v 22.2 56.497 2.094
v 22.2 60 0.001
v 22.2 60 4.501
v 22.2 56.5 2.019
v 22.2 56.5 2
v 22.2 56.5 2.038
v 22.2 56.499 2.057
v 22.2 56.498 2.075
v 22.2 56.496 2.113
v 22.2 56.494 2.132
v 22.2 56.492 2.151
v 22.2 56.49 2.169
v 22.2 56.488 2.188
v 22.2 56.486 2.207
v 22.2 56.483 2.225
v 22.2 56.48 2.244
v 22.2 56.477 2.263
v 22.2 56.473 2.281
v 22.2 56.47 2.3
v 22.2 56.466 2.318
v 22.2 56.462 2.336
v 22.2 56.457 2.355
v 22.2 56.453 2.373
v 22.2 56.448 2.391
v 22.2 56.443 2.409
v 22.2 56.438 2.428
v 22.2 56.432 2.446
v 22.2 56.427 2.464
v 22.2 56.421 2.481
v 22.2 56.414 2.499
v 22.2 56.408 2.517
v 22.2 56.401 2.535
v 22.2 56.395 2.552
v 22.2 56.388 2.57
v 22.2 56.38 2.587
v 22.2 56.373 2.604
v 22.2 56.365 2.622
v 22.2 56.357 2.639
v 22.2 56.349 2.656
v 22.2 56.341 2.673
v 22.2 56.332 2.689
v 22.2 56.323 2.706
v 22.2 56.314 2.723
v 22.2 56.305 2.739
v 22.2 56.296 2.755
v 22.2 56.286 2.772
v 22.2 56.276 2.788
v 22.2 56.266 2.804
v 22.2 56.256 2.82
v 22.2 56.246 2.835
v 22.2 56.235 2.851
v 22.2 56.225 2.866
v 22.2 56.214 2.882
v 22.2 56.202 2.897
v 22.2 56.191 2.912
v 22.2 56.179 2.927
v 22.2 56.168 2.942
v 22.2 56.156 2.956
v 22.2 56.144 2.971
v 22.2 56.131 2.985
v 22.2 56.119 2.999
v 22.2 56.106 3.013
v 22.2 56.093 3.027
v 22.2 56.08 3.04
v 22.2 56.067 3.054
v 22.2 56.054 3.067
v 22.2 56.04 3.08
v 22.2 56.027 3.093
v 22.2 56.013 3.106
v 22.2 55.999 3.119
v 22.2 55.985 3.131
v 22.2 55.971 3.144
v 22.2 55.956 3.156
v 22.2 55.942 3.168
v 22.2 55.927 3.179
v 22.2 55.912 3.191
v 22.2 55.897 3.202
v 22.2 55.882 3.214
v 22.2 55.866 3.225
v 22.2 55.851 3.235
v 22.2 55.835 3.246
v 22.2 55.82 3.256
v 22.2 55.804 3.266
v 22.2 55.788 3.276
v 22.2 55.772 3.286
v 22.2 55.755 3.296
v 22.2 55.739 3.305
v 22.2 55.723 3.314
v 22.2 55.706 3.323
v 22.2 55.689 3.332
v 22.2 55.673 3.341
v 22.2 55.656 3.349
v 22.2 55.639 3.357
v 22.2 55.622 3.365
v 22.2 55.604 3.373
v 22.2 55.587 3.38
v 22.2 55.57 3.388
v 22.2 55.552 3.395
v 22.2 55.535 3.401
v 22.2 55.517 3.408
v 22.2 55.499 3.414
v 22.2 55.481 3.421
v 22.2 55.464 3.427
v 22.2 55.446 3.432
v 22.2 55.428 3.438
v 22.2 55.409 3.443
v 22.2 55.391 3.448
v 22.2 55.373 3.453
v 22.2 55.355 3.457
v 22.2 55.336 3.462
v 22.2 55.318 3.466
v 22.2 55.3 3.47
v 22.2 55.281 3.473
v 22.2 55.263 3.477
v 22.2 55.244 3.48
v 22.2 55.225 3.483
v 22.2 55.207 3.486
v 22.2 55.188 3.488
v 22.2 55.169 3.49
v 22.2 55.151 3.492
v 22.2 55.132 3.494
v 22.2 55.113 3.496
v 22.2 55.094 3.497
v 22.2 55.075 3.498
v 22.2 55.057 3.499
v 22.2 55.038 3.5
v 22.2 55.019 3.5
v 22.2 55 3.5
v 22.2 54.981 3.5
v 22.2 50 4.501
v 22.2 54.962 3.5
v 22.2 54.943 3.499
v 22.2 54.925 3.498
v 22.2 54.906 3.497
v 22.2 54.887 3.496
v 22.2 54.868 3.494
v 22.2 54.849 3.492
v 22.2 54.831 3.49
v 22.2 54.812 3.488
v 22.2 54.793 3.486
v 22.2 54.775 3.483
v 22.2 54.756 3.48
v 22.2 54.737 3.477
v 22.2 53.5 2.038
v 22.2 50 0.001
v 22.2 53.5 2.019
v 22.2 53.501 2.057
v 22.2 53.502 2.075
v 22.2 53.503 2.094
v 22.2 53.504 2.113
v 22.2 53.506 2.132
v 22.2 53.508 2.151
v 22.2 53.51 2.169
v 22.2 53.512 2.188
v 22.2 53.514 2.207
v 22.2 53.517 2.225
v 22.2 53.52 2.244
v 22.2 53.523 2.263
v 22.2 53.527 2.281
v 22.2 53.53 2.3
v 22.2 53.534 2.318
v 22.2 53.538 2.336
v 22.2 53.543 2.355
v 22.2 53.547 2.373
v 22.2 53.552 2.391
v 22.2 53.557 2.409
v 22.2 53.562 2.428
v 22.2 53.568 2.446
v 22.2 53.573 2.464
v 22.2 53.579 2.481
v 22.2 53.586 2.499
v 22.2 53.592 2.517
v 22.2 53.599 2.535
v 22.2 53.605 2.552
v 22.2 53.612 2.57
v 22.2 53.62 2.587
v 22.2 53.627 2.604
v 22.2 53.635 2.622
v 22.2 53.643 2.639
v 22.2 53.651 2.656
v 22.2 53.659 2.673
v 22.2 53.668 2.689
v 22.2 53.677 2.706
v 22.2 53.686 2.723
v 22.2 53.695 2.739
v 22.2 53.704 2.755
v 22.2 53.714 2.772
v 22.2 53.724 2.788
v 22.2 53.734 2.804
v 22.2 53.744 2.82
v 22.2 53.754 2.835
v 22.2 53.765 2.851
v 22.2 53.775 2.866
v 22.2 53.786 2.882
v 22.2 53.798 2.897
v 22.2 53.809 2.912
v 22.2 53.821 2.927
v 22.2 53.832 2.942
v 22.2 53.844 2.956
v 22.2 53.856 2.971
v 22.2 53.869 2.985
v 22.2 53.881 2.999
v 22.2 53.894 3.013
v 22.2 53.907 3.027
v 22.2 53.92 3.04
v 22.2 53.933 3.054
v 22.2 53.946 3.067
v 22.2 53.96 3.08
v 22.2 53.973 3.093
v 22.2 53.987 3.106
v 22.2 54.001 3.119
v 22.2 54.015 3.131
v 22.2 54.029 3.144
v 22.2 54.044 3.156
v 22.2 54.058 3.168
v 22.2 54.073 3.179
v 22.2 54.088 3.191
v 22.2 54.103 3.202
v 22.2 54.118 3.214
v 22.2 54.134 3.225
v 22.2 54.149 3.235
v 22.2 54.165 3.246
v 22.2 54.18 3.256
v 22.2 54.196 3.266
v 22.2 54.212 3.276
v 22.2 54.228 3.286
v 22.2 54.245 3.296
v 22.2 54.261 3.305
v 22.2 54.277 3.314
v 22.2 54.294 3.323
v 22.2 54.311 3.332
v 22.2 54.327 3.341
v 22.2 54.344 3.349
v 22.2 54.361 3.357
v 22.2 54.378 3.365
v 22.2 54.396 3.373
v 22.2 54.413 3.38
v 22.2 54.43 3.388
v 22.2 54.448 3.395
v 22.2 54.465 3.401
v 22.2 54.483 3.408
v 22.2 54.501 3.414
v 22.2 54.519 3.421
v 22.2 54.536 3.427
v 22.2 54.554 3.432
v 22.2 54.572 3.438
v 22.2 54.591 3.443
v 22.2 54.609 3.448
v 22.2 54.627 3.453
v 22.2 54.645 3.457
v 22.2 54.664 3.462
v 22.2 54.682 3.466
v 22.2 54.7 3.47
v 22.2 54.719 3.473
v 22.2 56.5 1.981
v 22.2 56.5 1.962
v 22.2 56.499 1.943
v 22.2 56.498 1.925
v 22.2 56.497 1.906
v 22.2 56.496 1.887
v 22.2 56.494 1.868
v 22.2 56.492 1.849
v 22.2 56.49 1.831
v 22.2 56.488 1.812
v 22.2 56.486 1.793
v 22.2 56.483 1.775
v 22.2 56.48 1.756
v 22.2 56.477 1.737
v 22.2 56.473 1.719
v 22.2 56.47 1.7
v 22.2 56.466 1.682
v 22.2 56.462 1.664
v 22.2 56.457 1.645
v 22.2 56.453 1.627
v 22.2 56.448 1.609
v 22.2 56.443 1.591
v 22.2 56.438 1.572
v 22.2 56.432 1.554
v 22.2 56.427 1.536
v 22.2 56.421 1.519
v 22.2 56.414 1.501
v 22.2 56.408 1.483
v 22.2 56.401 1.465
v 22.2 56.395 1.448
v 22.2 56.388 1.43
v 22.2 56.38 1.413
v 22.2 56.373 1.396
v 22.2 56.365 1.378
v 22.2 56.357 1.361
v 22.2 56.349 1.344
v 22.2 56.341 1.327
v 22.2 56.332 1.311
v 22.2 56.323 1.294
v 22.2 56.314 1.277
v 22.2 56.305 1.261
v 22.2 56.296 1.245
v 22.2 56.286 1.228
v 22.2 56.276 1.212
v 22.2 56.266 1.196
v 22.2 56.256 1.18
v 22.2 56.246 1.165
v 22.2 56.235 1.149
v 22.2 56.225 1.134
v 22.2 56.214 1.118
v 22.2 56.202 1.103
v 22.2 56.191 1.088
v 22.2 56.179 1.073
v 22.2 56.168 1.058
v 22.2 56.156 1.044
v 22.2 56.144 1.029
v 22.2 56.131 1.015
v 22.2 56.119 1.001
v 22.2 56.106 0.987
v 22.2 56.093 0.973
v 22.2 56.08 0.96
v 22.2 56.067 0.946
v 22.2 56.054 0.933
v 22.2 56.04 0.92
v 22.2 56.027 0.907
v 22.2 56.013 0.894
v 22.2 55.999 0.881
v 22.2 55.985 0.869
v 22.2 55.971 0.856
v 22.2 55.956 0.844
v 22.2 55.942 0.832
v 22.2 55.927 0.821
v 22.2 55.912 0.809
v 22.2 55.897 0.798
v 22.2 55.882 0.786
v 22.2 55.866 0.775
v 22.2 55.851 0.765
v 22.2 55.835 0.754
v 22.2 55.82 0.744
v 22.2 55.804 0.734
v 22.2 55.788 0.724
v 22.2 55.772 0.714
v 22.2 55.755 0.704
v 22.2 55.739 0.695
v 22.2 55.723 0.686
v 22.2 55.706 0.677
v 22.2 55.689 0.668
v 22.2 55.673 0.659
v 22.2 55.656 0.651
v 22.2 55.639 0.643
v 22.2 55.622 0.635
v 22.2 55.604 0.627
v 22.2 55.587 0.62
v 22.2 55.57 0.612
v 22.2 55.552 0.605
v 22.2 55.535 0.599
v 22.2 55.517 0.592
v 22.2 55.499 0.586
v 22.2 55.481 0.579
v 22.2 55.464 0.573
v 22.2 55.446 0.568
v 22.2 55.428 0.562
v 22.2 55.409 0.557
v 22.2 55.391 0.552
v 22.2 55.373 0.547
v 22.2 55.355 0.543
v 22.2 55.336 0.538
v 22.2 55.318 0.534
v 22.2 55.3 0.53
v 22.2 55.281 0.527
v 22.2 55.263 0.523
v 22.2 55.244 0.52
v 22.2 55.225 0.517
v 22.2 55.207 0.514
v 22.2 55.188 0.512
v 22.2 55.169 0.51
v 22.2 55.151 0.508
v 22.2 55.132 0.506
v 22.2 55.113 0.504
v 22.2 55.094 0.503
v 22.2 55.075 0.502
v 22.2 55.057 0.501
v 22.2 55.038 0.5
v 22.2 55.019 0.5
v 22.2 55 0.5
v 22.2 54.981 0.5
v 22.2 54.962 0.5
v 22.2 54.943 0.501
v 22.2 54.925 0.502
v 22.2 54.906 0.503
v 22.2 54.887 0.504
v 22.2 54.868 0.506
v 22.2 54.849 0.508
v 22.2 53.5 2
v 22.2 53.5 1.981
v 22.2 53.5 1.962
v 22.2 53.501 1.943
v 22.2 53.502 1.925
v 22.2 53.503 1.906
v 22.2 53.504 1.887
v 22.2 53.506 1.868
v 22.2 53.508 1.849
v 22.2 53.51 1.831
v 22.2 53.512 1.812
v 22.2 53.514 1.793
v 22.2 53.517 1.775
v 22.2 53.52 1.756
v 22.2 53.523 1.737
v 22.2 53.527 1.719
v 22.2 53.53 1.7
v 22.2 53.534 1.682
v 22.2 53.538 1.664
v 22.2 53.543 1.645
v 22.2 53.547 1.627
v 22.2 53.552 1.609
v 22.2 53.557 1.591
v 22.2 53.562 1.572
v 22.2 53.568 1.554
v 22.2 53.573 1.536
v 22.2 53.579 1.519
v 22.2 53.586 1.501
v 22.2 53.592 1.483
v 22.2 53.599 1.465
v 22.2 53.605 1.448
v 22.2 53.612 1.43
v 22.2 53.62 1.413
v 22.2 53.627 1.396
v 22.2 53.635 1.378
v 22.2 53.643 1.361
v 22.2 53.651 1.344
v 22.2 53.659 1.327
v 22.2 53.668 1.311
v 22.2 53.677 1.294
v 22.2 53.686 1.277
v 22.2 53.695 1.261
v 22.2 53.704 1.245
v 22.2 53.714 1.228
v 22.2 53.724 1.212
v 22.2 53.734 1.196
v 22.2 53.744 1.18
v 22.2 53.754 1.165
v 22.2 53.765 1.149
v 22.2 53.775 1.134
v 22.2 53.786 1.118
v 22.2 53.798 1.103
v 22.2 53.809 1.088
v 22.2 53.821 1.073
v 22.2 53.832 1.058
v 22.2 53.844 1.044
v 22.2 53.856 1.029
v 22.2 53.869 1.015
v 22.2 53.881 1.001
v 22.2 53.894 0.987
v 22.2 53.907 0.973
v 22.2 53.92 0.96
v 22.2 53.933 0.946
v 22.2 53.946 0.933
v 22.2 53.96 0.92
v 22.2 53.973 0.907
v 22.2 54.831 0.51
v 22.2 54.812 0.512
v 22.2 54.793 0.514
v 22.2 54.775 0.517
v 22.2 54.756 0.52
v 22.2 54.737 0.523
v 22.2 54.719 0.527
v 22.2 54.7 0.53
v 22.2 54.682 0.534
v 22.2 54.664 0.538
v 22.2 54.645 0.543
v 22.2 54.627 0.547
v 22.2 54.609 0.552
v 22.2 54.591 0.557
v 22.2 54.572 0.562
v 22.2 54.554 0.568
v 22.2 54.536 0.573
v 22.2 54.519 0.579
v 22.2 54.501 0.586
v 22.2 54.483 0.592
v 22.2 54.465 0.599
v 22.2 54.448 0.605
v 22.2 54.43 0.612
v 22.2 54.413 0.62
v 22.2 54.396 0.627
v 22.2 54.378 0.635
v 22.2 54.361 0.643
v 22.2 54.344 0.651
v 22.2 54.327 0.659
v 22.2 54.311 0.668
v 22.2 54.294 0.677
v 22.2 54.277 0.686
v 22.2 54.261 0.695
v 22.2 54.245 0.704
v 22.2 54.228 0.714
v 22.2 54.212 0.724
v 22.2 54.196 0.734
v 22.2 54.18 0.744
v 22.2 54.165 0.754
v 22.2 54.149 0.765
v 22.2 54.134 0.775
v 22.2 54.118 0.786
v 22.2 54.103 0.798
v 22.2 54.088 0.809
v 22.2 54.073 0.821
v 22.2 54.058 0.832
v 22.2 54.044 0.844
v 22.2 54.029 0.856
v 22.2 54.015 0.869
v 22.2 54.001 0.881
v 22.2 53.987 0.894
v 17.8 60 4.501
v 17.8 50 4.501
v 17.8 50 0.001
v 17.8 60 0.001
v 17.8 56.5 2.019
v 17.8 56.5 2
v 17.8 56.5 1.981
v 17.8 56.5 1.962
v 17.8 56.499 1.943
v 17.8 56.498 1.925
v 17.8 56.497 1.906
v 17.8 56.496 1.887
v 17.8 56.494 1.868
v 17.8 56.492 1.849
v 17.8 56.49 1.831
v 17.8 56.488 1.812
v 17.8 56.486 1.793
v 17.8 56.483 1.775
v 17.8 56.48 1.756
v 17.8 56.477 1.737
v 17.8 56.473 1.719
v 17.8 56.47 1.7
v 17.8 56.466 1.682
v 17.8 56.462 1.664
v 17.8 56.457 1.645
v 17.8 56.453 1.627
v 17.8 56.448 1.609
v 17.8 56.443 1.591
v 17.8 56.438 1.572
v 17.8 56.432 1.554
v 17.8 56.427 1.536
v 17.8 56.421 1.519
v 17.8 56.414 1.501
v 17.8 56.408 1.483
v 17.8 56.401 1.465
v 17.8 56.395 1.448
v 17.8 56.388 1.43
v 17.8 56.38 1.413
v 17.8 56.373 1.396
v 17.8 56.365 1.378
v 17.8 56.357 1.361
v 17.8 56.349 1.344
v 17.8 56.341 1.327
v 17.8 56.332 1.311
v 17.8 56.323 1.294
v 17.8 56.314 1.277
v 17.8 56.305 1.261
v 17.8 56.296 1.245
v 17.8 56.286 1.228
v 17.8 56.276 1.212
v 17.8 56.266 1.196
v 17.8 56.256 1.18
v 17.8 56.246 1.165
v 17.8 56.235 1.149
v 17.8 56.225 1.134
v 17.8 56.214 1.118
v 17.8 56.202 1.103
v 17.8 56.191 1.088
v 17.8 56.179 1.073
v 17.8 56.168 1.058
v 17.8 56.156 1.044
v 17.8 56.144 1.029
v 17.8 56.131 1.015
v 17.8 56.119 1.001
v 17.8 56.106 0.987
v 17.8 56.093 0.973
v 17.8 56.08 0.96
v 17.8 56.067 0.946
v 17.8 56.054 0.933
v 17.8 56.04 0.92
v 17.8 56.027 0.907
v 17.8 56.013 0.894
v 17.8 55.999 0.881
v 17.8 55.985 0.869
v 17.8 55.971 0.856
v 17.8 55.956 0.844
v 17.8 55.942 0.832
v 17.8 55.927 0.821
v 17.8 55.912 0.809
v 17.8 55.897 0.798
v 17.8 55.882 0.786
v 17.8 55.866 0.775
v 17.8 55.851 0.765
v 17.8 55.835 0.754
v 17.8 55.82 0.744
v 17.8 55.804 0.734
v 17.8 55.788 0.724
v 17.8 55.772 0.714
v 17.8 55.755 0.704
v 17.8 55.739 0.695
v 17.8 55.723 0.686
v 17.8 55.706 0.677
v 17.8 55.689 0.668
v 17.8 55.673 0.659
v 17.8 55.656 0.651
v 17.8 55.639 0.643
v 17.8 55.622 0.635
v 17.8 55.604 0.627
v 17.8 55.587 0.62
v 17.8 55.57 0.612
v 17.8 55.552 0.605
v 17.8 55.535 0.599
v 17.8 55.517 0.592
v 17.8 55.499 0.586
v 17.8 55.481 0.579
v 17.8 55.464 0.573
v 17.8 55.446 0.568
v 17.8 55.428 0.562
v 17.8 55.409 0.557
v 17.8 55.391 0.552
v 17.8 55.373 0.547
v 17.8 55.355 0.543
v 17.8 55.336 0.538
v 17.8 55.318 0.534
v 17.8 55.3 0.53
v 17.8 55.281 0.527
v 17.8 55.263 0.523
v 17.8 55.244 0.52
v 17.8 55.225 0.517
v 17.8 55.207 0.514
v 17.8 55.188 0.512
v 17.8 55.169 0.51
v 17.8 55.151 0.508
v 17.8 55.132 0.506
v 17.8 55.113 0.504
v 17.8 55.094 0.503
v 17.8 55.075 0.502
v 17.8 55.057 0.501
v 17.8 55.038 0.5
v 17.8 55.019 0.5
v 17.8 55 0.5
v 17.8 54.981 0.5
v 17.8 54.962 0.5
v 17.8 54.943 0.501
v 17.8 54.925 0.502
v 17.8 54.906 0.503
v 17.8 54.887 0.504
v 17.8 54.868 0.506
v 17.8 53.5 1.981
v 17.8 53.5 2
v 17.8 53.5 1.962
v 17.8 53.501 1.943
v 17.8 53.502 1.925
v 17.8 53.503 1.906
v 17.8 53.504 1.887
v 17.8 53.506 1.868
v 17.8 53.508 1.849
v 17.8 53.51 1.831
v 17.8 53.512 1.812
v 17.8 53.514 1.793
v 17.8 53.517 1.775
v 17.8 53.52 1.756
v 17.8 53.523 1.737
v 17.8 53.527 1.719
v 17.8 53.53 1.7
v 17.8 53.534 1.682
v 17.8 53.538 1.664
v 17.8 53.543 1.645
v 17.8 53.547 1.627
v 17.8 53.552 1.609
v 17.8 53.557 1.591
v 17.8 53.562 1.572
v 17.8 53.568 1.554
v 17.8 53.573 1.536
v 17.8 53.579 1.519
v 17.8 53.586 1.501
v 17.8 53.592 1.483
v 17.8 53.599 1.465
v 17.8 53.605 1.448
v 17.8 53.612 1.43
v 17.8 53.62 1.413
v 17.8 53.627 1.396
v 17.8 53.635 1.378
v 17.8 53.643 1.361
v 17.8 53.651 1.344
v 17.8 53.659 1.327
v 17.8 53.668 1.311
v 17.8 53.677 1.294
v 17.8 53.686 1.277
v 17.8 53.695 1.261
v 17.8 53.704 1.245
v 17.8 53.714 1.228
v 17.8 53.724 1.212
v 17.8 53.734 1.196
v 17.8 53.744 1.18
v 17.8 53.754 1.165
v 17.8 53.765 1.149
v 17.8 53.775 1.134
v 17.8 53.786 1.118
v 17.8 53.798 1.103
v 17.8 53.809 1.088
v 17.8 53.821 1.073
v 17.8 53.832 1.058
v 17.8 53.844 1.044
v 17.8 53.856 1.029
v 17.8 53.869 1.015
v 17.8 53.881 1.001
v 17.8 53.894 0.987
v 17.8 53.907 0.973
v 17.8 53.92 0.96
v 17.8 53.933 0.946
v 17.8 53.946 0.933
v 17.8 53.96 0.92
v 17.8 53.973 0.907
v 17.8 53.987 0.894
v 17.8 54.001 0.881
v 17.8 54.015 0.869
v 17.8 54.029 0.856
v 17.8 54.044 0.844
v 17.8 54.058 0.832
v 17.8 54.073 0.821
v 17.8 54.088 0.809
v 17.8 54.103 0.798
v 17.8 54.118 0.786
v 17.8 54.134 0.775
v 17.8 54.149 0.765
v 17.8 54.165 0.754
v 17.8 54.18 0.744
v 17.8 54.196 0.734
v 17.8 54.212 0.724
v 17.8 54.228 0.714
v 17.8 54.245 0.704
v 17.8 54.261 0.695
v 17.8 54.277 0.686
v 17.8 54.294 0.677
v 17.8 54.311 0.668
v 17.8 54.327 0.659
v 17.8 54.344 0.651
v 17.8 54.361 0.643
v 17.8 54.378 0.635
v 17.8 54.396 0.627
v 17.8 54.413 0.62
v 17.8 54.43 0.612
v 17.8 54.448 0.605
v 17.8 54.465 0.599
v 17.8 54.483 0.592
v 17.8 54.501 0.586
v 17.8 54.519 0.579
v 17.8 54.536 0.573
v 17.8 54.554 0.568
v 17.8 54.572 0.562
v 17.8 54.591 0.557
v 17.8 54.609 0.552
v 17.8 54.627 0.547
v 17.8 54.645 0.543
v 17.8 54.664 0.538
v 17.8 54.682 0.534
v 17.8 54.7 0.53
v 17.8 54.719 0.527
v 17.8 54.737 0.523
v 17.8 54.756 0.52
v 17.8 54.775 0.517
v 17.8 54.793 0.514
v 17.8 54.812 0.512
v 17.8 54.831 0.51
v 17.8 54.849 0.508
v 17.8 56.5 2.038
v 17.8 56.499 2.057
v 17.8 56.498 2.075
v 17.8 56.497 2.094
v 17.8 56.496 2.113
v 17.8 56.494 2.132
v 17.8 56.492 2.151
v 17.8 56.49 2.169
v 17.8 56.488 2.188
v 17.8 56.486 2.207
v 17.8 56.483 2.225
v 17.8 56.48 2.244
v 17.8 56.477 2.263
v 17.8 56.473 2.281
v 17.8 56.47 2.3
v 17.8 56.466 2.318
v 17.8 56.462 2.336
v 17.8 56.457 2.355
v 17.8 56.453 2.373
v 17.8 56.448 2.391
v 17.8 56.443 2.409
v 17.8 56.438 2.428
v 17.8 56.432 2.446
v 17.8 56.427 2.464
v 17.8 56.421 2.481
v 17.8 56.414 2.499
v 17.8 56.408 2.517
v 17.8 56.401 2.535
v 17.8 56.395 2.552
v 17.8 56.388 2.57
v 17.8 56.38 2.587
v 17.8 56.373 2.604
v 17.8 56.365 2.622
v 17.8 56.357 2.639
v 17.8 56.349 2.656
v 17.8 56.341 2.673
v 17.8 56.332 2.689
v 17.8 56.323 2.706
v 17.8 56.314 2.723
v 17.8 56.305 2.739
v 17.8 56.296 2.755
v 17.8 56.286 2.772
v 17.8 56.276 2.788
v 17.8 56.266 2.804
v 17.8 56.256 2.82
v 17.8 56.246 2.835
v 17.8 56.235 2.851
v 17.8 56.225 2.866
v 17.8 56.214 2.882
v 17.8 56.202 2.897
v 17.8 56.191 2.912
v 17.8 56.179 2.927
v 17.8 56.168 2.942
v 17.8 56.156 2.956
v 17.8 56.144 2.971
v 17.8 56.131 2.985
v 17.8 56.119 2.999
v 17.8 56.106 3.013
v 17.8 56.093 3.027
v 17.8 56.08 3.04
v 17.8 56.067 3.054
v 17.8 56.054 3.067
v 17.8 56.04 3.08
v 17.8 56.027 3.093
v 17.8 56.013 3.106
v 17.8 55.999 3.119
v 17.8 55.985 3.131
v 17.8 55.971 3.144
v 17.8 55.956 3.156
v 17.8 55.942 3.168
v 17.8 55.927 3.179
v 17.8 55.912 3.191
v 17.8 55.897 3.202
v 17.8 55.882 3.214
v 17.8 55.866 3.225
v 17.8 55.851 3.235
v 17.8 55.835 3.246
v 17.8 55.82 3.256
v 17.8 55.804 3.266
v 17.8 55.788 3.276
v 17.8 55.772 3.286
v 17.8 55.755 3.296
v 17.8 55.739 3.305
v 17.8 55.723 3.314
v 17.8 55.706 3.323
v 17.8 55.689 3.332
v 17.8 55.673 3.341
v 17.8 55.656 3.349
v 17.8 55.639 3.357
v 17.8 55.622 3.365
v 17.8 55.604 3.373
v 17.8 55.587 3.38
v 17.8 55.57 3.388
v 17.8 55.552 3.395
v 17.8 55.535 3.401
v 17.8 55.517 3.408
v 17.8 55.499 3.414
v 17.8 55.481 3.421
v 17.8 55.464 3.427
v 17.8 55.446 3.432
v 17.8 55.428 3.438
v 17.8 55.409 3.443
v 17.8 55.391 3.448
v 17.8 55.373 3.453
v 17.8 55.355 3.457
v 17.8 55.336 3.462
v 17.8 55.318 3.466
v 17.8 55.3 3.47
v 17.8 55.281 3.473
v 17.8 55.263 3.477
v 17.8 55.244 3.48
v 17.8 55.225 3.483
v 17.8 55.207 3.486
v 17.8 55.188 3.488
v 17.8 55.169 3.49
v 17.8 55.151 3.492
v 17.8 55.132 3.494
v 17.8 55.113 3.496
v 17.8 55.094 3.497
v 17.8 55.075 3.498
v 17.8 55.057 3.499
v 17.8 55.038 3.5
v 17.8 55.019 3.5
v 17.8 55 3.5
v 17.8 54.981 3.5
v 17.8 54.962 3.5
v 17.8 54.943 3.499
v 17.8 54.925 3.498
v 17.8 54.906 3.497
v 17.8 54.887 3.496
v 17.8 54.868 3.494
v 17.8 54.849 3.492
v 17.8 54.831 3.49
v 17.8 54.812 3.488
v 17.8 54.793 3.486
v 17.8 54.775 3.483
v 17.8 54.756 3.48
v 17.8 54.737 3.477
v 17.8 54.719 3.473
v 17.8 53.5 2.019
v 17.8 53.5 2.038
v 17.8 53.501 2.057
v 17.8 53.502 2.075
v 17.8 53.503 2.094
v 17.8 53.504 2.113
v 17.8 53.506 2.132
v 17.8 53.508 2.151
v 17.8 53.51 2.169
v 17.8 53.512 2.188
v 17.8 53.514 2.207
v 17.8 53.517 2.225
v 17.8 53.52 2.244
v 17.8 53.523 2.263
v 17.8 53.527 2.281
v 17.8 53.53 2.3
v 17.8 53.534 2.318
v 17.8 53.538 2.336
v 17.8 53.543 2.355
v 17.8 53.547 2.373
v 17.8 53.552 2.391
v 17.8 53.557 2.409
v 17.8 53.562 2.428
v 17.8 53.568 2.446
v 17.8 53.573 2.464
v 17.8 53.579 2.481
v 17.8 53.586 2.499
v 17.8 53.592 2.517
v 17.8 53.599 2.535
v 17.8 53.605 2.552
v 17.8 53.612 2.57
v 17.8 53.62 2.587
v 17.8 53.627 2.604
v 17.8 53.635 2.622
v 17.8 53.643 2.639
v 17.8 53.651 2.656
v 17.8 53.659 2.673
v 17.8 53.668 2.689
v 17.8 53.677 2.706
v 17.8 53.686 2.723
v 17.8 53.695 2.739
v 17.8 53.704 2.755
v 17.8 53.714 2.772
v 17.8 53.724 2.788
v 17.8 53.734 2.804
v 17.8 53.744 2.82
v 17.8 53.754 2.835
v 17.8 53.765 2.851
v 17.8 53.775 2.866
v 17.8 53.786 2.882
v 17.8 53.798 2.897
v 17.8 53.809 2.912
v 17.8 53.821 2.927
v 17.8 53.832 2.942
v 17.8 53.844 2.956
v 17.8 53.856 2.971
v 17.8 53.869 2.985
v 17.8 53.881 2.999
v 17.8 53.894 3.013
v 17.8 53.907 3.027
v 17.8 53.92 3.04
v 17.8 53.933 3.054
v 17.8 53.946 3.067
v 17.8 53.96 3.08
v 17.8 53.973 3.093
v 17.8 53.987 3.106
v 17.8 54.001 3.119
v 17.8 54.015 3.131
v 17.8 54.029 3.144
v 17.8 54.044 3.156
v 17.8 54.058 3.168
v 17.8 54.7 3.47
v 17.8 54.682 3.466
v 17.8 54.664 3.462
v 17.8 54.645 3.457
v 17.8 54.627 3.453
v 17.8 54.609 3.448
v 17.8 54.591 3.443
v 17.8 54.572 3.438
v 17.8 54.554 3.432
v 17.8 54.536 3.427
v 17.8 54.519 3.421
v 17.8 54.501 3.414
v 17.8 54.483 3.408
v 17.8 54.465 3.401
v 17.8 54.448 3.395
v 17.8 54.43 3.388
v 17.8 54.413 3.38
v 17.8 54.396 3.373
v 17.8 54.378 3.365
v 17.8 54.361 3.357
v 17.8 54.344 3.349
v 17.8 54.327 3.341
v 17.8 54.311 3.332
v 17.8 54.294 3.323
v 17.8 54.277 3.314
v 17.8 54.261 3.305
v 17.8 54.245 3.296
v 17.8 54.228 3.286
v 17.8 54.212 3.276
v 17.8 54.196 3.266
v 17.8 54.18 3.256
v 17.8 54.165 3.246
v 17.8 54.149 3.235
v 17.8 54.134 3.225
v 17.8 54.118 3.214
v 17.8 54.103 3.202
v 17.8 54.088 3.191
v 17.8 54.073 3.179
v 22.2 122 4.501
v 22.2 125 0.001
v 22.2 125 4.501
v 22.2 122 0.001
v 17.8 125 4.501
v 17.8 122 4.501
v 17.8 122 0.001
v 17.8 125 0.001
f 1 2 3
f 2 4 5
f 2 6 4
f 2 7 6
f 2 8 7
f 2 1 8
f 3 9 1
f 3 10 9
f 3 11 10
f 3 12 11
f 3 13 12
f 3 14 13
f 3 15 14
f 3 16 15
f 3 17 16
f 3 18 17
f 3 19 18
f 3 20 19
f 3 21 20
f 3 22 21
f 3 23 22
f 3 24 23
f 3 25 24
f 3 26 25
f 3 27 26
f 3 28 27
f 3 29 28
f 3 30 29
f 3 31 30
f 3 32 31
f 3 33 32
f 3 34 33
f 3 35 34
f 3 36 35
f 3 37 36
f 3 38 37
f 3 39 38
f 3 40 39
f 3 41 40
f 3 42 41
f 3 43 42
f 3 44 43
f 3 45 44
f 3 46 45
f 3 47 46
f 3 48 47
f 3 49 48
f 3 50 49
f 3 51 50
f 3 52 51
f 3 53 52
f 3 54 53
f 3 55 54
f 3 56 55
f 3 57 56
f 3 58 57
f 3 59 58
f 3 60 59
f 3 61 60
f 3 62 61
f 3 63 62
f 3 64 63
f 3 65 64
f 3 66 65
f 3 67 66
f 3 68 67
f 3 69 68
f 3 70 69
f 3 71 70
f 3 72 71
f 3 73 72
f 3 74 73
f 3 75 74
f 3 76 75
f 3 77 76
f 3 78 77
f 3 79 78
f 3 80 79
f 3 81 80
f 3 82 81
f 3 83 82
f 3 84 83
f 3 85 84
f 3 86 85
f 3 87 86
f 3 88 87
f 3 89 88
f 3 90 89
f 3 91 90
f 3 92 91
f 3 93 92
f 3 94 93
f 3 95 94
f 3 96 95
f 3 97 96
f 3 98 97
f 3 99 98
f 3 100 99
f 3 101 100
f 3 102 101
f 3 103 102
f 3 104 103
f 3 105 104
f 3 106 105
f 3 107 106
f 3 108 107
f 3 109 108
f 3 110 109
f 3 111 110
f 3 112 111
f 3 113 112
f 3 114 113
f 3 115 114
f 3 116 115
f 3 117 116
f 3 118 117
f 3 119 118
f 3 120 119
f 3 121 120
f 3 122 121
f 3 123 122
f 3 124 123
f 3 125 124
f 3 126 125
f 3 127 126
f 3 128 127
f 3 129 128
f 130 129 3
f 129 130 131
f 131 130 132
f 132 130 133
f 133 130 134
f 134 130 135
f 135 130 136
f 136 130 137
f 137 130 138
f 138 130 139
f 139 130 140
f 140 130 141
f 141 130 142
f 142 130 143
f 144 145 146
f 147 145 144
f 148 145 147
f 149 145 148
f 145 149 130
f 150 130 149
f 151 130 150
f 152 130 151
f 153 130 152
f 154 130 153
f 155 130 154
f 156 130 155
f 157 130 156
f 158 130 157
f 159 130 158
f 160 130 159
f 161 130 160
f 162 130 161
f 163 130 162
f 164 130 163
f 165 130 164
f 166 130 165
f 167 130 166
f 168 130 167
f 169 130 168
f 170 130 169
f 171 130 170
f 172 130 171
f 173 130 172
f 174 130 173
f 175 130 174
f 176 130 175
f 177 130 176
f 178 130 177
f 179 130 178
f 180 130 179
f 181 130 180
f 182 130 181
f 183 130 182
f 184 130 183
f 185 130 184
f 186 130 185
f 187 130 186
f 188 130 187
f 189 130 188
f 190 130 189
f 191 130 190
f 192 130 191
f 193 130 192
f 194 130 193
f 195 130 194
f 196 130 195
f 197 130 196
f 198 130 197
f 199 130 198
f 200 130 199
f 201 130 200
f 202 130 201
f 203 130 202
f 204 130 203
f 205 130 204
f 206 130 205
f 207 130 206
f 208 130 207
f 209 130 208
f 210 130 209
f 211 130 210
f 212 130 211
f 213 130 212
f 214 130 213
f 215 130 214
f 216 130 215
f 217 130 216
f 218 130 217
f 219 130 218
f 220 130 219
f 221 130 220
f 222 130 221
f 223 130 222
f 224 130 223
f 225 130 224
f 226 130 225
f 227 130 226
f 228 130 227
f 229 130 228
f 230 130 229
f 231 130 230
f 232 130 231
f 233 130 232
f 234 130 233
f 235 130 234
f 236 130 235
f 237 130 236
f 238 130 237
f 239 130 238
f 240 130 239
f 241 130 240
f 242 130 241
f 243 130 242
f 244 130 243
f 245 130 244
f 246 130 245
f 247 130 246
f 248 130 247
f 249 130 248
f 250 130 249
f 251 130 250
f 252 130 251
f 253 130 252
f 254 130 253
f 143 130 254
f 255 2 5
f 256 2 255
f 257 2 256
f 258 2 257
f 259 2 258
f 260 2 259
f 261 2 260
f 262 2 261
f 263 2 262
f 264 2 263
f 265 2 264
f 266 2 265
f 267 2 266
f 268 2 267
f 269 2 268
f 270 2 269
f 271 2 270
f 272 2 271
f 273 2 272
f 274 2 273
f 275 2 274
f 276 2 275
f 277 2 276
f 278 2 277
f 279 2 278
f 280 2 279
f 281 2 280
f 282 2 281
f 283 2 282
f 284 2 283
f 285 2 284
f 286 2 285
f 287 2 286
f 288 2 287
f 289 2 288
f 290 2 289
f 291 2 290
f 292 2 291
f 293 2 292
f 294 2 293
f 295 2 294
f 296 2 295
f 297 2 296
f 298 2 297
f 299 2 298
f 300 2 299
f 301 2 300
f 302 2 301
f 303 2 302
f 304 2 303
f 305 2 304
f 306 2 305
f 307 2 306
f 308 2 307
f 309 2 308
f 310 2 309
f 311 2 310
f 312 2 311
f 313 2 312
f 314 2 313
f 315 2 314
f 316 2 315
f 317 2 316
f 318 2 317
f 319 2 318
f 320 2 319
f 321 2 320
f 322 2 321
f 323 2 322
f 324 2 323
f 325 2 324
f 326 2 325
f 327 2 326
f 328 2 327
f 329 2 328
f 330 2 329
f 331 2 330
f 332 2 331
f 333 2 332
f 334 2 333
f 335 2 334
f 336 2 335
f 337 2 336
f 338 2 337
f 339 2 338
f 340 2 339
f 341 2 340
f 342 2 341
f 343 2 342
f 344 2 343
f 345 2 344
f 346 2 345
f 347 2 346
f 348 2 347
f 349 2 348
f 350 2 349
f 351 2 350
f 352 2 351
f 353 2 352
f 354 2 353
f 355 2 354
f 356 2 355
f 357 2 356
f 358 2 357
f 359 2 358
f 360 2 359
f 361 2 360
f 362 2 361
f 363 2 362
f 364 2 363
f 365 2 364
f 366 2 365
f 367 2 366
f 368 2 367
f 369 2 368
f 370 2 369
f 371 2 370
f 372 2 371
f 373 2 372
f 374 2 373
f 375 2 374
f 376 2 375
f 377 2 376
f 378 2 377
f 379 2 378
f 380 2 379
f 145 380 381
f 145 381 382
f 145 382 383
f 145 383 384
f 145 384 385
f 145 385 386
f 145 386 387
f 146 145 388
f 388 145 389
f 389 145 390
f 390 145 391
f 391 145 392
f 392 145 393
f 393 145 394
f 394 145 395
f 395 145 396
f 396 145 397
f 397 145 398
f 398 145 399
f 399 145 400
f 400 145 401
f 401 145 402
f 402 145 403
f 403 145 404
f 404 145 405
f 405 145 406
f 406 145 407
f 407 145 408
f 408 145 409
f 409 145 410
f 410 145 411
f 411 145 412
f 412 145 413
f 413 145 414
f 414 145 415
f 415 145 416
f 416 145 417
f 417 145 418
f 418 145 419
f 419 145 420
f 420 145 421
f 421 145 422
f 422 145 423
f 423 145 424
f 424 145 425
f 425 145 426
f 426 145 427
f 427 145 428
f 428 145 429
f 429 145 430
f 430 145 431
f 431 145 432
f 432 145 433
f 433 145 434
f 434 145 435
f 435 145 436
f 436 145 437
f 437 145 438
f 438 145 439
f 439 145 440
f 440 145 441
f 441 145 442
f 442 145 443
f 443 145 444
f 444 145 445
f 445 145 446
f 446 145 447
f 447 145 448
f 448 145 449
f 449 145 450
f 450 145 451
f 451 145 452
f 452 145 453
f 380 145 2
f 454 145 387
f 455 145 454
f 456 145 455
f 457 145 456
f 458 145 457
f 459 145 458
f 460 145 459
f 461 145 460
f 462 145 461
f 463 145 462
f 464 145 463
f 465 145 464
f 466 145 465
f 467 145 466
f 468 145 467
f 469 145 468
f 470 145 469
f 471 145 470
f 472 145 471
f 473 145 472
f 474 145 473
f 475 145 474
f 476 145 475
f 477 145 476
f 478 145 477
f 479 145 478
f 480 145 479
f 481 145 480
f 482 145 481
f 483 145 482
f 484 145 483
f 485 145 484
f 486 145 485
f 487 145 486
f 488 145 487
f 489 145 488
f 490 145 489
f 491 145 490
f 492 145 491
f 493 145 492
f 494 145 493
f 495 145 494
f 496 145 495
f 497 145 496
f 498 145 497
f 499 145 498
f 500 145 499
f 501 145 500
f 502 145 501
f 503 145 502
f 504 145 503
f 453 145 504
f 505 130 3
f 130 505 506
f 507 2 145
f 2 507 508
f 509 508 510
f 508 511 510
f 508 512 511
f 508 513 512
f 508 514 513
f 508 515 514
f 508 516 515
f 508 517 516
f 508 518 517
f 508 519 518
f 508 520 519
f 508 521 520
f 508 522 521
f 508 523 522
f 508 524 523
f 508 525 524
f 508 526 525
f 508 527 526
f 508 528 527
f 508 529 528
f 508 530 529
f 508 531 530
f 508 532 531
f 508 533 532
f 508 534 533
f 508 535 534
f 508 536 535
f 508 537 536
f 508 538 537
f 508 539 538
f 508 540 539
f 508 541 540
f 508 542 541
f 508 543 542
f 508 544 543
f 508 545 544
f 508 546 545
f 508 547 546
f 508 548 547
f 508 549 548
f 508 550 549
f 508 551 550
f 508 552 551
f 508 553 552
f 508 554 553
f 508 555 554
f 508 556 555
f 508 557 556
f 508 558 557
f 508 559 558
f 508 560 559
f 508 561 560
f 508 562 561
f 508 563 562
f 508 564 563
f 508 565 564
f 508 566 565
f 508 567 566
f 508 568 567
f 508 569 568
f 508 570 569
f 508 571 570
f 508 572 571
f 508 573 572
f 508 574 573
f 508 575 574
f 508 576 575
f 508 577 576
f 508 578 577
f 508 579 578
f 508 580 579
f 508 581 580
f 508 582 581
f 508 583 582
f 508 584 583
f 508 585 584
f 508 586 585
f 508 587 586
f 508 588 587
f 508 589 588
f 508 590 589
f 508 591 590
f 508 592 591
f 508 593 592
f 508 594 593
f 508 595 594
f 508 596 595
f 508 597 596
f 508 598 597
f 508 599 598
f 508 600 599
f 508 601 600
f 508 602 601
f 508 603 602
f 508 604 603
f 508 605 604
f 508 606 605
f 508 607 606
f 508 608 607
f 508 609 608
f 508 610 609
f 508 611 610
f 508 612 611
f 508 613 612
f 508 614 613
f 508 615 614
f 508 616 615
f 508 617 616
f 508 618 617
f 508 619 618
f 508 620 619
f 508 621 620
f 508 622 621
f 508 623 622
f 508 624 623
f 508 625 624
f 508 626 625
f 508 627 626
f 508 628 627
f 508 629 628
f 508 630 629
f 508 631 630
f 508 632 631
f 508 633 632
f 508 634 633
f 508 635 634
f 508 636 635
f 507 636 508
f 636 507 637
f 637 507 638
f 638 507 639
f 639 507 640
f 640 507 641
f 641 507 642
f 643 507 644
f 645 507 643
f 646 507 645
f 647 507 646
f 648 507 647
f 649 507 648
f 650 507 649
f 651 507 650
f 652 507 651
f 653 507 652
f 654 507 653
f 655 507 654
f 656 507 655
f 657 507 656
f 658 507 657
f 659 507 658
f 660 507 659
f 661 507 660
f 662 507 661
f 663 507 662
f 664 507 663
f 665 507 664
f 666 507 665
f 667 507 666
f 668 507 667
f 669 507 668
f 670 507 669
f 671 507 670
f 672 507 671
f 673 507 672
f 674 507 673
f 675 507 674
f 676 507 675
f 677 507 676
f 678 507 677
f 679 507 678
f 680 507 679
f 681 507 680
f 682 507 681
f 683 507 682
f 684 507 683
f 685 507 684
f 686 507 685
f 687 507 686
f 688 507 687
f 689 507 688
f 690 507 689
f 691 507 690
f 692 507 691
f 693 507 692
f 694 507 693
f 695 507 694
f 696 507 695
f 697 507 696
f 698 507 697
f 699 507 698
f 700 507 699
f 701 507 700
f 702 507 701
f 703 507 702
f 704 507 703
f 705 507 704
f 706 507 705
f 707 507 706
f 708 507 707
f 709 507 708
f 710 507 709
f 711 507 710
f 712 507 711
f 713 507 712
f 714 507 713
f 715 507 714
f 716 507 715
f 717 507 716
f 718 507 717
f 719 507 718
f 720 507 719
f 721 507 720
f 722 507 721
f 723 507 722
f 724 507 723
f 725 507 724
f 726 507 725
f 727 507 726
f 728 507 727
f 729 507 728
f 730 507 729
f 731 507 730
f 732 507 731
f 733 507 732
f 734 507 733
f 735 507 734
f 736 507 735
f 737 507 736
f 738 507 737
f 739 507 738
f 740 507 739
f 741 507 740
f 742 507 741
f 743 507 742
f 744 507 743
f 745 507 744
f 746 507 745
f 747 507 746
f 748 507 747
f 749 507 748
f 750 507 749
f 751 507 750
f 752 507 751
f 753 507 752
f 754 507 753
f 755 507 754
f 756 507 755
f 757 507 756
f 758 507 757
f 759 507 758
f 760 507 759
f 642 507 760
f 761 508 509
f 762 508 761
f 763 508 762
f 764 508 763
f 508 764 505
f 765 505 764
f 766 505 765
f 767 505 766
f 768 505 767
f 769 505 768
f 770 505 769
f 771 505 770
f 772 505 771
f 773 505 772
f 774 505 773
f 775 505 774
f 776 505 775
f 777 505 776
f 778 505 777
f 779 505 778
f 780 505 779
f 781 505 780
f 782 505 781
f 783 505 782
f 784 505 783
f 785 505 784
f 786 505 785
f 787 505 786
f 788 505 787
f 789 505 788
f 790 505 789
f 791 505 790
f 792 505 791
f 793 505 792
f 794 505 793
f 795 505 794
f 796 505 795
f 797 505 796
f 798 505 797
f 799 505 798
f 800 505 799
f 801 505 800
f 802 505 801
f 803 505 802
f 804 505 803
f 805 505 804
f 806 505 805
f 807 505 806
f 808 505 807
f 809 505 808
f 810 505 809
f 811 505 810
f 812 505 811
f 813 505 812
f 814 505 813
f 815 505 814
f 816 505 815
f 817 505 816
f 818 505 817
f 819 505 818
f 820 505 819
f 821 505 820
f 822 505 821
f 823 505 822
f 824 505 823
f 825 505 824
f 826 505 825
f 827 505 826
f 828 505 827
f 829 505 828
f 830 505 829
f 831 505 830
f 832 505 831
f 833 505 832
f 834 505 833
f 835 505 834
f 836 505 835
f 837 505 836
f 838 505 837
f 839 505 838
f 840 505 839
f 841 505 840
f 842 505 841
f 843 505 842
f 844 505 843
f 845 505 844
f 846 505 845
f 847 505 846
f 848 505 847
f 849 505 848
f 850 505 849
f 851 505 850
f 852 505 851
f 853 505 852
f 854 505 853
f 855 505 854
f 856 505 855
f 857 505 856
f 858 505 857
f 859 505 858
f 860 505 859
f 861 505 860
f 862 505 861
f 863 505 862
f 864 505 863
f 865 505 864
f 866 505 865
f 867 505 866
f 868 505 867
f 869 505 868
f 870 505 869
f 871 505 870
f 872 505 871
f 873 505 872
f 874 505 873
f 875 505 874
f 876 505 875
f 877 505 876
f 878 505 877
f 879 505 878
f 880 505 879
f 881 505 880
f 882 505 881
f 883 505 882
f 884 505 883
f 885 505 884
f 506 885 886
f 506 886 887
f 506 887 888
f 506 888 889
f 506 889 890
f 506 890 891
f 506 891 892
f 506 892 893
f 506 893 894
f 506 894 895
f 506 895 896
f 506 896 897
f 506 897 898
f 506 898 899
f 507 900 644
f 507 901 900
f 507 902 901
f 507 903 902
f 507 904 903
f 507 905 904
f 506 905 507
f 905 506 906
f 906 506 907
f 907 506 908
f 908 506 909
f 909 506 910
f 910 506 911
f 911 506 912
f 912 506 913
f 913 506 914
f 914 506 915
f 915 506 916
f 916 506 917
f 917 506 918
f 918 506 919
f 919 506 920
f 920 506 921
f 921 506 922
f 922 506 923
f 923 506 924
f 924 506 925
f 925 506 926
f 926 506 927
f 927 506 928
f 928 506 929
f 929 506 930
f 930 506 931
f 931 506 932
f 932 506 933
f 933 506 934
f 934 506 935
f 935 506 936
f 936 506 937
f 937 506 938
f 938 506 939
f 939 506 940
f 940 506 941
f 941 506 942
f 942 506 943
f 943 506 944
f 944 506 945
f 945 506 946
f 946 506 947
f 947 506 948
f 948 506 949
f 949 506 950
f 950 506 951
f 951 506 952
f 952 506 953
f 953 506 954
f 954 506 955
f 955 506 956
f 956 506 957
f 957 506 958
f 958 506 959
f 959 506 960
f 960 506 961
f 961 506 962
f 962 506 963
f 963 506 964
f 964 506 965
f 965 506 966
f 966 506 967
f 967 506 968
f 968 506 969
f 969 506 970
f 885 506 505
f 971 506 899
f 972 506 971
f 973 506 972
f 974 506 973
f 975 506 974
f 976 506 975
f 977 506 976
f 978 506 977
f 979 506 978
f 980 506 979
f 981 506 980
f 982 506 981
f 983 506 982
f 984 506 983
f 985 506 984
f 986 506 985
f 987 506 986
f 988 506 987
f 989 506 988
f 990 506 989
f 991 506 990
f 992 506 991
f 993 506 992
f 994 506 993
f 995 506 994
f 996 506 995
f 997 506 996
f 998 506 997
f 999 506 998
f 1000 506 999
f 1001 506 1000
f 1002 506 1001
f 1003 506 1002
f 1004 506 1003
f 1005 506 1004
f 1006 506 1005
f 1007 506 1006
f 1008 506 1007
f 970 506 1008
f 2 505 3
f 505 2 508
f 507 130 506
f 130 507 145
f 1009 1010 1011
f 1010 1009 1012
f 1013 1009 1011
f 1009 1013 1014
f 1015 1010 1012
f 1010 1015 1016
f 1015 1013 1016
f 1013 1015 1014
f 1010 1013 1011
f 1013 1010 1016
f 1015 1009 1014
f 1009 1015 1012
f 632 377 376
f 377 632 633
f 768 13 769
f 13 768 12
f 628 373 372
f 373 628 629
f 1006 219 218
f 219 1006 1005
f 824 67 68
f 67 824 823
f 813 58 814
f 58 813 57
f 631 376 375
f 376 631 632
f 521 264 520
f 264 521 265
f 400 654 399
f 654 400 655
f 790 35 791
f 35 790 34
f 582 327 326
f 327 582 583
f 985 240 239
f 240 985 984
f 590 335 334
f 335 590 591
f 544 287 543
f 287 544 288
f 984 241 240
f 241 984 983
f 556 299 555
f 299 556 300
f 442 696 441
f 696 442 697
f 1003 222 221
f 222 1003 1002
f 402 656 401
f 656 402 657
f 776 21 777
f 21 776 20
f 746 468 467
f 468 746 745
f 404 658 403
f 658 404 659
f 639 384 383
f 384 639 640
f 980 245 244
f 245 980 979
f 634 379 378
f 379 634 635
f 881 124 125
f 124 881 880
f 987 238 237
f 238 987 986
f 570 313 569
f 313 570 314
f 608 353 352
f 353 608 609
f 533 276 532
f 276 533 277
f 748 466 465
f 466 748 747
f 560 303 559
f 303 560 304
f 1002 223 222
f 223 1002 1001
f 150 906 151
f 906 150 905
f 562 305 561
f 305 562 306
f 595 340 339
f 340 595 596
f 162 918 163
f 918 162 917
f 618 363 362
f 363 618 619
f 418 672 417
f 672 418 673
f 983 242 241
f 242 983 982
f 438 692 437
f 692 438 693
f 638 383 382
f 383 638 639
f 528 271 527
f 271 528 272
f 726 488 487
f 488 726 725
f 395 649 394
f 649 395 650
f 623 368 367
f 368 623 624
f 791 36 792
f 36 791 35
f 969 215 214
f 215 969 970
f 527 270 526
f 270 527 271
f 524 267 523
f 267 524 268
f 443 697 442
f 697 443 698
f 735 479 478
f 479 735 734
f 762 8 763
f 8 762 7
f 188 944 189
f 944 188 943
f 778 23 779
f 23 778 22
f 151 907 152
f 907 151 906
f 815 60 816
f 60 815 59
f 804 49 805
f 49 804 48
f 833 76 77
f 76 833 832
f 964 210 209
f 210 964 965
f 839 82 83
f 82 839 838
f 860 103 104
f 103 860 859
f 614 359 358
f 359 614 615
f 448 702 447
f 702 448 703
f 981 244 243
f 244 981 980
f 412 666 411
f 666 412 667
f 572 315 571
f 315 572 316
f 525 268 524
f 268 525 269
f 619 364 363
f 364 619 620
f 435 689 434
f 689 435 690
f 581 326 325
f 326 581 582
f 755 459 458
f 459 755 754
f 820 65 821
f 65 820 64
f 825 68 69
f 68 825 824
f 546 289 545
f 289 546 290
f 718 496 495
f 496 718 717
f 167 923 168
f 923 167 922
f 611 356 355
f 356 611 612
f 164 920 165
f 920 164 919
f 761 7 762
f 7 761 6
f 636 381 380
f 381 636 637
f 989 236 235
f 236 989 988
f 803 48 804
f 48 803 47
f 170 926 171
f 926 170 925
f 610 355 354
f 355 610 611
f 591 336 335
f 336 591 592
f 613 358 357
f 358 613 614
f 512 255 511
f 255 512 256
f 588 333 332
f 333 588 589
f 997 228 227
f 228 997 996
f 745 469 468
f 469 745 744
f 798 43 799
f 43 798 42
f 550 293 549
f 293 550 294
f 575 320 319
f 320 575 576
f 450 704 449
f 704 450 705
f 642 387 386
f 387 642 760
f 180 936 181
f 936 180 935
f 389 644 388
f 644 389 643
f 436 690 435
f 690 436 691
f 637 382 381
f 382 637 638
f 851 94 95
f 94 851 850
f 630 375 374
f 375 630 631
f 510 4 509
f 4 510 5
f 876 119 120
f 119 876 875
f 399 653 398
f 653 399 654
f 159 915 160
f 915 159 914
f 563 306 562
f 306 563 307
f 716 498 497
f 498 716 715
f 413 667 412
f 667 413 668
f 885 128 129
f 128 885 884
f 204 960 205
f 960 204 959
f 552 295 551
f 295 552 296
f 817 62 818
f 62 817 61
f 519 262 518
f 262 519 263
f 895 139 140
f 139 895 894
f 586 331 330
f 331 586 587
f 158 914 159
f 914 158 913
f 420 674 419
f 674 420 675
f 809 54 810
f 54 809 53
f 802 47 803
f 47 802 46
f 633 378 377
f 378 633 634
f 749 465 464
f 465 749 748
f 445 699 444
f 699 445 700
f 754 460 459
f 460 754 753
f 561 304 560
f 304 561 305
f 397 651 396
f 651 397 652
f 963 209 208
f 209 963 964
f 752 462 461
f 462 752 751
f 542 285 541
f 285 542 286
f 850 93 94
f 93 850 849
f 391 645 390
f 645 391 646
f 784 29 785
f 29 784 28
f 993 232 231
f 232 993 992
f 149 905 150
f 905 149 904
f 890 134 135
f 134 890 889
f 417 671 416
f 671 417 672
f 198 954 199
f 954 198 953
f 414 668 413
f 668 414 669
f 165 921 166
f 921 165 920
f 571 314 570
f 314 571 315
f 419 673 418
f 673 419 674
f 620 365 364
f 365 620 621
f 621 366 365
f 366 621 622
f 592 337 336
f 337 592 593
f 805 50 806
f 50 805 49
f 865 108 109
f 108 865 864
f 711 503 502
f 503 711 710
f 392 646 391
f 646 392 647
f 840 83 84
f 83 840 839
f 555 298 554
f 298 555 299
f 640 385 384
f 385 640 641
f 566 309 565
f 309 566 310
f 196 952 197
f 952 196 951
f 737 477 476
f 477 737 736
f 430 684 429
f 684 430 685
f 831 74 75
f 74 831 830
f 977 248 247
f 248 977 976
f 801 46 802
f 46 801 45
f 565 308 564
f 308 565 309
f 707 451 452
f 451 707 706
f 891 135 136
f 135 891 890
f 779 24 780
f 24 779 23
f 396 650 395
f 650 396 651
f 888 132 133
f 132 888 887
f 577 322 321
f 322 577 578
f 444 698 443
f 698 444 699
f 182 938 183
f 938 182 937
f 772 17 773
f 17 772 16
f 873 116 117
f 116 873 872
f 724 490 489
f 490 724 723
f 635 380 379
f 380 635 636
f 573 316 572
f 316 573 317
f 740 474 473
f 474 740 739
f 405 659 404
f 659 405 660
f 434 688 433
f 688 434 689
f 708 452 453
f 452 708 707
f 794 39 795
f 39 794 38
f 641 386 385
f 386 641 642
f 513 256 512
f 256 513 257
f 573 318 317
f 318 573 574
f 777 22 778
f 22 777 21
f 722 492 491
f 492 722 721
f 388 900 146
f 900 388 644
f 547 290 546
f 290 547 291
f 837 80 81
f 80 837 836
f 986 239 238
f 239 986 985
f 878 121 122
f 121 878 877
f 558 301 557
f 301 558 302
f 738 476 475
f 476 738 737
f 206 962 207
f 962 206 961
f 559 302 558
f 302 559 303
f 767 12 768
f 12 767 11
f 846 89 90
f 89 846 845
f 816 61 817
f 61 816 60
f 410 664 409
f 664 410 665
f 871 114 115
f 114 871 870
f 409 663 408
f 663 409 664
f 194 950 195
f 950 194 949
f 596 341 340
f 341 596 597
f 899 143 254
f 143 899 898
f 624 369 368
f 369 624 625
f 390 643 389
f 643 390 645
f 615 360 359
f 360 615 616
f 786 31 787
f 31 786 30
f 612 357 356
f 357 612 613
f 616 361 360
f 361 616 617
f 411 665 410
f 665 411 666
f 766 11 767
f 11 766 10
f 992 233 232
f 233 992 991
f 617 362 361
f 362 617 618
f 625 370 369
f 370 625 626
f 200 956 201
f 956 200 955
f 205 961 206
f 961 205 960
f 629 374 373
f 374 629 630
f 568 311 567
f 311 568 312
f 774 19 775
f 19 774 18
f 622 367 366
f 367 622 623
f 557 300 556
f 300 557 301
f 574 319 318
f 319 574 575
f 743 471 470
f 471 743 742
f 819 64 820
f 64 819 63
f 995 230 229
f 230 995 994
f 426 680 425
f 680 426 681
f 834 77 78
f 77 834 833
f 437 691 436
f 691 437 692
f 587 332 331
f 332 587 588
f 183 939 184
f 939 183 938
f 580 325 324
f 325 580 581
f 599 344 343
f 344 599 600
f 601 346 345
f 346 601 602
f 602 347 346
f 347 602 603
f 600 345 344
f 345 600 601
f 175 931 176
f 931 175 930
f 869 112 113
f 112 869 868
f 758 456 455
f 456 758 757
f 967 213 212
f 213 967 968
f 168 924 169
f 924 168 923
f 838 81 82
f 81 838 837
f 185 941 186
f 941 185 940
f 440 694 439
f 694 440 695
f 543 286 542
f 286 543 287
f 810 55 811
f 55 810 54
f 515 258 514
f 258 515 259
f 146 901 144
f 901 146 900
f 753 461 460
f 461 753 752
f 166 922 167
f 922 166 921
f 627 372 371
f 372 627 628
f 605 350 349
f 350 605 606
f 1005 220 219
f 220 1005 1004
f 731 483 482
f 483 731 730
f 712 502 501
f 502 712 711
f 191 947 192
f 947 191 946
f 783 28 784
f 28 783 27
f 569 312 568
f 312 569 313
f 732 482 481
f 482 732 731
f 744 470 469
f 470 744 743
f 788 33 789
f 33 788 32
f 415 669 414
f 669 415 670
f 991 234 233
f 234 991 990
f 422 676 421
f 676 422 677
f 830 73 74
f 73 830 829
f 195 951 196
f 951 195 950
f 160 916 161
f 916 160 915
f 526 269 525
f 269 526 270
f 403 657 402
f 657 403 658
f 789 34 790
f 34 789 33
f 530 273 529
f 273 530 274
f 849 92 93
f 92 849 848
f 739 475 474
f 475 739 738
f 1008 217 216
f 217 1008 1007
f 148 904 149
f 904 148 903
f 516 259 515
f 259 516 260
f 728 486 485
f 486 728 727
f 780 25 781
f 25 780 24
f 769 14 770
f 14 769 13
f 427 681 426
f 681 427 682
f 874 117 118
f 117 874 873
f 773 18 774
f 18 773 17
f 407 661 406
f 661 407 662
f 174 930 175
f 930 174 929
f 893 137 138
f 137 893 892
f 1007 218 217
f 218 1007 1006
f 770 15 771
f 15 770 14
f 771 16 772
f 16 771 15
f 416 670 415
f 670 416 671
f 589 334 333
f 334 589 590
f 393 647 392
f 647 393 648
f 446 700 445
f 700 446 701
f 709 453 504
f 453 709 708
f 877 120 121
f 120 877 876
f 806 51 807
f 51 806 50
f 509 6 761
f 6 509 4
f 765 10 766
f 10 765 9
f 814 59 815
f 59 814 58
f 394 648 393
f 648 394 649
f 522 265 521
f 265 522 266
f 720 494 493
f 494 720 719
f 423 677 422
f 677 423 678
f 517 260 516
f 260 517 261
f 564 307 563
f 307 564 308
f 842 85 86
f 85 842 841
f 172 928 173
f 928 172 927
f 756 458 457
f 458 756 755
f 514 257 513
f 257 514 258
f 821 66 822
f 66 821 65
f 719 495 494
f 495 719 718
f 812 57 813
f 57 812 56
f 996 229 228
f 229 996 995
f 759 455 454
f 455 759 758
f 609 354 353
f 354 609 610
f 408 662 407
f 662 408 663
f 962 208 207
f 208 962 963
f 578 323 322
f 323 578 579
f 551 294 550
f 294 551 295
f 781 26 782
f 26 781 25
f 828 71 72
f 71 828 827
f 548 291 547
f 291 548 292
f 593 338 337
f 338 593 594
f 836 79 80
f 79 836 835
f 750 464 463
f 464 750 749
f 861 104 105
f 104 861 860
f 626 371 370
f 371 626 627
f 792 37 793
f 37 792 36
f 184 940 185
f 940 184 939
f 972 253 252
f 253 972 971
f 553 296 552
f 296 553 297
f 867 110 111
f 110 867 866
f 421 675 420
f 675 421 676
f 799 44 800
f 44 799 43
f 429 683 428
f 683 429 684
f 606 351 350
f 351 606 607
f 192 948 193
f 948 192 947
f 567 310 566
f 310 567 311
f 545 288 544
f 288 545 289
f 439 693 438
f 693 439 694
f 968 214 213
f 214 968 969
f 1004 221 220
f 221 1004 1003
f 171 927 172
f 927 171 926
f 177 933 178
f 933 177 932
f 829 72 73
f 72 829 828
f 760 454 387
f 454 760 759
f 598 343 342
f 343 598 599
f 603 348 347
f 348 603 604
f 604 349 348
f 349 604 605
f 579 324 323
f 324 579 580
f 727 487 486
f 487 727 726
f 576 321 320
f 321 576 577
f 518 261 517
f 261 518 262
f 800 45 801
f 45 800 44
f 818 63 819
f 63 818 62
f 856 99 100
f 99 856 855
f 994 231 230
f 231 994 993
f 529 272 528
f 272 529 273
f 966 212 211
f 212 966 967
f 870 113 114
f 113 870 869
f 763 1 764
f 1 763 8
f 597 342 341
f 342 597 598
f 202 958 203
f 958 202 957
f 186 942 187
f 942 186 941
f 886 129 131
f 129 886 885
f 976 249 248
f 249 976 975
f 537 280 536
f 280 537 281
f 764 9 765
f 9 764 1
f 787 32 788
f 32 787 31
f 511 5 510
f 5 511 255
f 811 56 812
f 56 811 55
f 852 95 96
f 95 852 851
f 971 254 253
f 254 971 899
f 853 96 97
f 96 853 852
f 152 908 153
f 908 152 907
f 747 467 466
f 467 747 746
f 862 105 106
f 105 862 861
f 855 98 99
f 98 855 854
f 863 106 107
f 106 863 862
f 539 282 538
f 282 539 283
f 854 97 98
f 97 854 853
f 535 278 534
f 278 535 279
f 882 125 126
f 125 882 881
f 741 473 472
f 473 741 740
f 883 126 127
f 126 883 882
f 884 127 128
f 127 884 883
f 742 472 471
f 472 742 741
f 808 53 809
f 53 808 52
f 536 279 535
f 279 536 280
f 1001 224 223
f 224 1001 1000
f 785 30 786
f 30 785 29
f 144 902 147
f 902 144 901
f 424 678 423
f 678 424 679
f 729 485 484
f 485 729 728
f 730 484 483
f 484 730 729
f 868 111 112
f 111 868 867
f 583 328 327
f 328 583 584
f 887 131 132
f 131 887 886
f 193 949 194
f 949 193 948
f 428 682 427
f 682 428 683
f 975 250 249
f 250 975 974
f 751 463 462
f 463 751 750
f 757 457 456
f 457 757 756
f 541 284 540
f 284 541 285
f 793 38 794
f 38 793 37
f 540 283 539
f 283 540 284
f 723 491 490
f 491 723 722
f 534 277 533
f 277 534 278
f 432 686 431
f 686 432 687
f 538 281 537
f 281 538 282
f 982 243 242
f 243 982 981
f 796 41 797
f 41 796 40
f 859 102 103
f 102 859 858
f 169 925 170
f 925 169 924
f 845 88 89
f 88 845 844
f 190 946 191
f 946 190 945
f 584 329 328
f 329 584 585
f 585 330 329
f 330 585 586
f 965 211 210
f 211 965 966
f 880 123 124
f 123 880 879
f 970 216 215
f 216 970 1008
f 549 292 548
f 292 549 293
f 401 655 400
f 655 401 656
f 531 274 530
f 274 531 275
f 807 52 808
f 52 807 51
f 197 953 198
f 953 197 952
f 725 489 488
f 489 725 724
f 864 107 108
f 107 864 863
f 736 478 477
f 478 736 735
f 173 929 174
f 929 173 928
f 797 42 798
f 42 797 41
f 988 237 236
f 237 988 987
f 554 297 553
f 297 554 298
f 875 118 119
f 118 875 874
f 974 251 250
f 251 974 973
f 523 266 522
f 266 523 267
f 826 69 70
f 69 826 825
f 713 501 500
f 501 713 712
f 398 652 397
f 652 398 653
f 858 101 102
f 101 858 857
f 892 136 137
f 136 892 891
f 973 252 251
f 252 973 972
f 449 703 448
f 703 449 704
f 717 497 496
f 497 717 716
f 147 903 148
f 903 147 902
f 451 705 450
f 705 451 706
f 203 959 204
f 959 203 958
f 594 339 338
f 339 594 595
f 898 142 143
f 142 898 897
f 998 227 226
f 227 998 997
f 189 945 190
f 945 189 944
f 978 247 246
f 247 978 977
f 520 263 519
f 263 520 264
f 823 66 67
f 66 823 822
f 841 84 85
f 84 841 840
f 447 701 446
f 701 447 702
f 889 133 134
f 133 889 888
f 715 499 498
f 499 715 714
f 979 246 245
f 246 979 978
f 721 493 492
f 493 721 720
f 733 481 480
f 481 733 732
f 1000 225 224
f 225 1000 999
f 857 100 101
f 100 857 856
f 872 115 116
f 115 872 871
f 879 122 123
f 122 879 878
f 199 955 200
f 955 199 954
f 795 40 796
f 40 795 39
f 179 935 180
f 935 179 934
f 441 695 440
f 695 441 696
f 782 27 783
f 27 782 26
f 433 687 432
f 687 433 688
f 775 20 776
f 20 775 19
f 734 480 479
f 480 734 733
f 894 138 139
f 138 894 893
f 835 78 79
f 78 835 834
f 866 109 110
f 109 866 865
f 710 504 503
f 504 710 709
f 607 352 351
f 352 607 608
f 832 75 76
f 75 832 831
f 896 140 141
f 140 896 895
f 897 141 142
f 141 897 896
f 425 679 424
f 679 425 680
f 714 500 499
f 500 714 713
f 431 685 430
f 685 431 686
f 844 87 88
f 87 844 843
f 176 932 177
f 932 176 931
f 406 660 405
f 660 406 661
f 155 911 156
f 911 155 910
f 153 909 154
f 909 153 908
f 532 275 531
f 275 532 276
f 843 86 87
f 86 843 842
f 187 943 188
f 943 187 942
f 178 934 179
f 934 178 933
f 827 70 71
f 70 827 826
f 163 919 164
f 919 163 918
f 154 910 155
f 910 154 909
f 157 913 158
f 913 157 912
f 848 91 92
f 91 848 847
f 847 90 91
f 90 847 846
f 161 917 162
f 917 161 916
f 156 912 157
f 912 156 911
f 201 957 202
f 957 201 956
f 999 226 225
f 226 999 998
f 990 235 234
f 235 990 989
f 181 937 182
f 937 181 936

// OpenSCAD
module aiguillage(){
    translate([-100,50,0])
      difference(){
        union(){

        linear_extrude (height=2)
            import (file="rails.dxf", layer="aiguillages-traverses", $fn=500);
          
        linear_extrude (height=4.5)
            import (file="rails.dxf", layer="aiguillages", $fn=500);
            translate([107.8,0,0.001])
            cube([4.4,10,20]);  
            translate([107.8 + 20.4 ,0,0.001])
            cube([4.4,10,20]);           
        }
       union(){
        //espacement pour faire coulisser la traverse
        translate([117.8,27.2,0])
        #cube([4.4,46,2.2]);
        //nut hole
        translate([100,5,15])
        rotate([0,90,0])    
        #cylinder( h=70, r=1.5 , $fn=500);
           
       }
    }
   
}

module aiguilles(){
    translate([-100,50,0])
    difference(){
    union(){
        
           translate([0,0,2.01])   
            linear_extrude (height=2.5)
                import (file="rails.dxf", layer="aiguillages-movables-parts", $fn=500);
        
            linear_extrude (height=2.02)
                import (file="rails.dxf", layer="aiguilles-down", $fn=500);
        
            translate([117.8,0,0.001])
                cube([4.4,10,4.5]);  
        
            //ergot de blocage
            translate([117.8,72,0.001])
                cube([4.4,3,4.5]);

        
        }
    
               //nut hole
       translate([100,5,2])
       rotate([0,90,0])    
       cylinder( h=70, r=1.5,  $fn=500);
        
    
    }
}

//aiguillage();
aiguilles();
        
